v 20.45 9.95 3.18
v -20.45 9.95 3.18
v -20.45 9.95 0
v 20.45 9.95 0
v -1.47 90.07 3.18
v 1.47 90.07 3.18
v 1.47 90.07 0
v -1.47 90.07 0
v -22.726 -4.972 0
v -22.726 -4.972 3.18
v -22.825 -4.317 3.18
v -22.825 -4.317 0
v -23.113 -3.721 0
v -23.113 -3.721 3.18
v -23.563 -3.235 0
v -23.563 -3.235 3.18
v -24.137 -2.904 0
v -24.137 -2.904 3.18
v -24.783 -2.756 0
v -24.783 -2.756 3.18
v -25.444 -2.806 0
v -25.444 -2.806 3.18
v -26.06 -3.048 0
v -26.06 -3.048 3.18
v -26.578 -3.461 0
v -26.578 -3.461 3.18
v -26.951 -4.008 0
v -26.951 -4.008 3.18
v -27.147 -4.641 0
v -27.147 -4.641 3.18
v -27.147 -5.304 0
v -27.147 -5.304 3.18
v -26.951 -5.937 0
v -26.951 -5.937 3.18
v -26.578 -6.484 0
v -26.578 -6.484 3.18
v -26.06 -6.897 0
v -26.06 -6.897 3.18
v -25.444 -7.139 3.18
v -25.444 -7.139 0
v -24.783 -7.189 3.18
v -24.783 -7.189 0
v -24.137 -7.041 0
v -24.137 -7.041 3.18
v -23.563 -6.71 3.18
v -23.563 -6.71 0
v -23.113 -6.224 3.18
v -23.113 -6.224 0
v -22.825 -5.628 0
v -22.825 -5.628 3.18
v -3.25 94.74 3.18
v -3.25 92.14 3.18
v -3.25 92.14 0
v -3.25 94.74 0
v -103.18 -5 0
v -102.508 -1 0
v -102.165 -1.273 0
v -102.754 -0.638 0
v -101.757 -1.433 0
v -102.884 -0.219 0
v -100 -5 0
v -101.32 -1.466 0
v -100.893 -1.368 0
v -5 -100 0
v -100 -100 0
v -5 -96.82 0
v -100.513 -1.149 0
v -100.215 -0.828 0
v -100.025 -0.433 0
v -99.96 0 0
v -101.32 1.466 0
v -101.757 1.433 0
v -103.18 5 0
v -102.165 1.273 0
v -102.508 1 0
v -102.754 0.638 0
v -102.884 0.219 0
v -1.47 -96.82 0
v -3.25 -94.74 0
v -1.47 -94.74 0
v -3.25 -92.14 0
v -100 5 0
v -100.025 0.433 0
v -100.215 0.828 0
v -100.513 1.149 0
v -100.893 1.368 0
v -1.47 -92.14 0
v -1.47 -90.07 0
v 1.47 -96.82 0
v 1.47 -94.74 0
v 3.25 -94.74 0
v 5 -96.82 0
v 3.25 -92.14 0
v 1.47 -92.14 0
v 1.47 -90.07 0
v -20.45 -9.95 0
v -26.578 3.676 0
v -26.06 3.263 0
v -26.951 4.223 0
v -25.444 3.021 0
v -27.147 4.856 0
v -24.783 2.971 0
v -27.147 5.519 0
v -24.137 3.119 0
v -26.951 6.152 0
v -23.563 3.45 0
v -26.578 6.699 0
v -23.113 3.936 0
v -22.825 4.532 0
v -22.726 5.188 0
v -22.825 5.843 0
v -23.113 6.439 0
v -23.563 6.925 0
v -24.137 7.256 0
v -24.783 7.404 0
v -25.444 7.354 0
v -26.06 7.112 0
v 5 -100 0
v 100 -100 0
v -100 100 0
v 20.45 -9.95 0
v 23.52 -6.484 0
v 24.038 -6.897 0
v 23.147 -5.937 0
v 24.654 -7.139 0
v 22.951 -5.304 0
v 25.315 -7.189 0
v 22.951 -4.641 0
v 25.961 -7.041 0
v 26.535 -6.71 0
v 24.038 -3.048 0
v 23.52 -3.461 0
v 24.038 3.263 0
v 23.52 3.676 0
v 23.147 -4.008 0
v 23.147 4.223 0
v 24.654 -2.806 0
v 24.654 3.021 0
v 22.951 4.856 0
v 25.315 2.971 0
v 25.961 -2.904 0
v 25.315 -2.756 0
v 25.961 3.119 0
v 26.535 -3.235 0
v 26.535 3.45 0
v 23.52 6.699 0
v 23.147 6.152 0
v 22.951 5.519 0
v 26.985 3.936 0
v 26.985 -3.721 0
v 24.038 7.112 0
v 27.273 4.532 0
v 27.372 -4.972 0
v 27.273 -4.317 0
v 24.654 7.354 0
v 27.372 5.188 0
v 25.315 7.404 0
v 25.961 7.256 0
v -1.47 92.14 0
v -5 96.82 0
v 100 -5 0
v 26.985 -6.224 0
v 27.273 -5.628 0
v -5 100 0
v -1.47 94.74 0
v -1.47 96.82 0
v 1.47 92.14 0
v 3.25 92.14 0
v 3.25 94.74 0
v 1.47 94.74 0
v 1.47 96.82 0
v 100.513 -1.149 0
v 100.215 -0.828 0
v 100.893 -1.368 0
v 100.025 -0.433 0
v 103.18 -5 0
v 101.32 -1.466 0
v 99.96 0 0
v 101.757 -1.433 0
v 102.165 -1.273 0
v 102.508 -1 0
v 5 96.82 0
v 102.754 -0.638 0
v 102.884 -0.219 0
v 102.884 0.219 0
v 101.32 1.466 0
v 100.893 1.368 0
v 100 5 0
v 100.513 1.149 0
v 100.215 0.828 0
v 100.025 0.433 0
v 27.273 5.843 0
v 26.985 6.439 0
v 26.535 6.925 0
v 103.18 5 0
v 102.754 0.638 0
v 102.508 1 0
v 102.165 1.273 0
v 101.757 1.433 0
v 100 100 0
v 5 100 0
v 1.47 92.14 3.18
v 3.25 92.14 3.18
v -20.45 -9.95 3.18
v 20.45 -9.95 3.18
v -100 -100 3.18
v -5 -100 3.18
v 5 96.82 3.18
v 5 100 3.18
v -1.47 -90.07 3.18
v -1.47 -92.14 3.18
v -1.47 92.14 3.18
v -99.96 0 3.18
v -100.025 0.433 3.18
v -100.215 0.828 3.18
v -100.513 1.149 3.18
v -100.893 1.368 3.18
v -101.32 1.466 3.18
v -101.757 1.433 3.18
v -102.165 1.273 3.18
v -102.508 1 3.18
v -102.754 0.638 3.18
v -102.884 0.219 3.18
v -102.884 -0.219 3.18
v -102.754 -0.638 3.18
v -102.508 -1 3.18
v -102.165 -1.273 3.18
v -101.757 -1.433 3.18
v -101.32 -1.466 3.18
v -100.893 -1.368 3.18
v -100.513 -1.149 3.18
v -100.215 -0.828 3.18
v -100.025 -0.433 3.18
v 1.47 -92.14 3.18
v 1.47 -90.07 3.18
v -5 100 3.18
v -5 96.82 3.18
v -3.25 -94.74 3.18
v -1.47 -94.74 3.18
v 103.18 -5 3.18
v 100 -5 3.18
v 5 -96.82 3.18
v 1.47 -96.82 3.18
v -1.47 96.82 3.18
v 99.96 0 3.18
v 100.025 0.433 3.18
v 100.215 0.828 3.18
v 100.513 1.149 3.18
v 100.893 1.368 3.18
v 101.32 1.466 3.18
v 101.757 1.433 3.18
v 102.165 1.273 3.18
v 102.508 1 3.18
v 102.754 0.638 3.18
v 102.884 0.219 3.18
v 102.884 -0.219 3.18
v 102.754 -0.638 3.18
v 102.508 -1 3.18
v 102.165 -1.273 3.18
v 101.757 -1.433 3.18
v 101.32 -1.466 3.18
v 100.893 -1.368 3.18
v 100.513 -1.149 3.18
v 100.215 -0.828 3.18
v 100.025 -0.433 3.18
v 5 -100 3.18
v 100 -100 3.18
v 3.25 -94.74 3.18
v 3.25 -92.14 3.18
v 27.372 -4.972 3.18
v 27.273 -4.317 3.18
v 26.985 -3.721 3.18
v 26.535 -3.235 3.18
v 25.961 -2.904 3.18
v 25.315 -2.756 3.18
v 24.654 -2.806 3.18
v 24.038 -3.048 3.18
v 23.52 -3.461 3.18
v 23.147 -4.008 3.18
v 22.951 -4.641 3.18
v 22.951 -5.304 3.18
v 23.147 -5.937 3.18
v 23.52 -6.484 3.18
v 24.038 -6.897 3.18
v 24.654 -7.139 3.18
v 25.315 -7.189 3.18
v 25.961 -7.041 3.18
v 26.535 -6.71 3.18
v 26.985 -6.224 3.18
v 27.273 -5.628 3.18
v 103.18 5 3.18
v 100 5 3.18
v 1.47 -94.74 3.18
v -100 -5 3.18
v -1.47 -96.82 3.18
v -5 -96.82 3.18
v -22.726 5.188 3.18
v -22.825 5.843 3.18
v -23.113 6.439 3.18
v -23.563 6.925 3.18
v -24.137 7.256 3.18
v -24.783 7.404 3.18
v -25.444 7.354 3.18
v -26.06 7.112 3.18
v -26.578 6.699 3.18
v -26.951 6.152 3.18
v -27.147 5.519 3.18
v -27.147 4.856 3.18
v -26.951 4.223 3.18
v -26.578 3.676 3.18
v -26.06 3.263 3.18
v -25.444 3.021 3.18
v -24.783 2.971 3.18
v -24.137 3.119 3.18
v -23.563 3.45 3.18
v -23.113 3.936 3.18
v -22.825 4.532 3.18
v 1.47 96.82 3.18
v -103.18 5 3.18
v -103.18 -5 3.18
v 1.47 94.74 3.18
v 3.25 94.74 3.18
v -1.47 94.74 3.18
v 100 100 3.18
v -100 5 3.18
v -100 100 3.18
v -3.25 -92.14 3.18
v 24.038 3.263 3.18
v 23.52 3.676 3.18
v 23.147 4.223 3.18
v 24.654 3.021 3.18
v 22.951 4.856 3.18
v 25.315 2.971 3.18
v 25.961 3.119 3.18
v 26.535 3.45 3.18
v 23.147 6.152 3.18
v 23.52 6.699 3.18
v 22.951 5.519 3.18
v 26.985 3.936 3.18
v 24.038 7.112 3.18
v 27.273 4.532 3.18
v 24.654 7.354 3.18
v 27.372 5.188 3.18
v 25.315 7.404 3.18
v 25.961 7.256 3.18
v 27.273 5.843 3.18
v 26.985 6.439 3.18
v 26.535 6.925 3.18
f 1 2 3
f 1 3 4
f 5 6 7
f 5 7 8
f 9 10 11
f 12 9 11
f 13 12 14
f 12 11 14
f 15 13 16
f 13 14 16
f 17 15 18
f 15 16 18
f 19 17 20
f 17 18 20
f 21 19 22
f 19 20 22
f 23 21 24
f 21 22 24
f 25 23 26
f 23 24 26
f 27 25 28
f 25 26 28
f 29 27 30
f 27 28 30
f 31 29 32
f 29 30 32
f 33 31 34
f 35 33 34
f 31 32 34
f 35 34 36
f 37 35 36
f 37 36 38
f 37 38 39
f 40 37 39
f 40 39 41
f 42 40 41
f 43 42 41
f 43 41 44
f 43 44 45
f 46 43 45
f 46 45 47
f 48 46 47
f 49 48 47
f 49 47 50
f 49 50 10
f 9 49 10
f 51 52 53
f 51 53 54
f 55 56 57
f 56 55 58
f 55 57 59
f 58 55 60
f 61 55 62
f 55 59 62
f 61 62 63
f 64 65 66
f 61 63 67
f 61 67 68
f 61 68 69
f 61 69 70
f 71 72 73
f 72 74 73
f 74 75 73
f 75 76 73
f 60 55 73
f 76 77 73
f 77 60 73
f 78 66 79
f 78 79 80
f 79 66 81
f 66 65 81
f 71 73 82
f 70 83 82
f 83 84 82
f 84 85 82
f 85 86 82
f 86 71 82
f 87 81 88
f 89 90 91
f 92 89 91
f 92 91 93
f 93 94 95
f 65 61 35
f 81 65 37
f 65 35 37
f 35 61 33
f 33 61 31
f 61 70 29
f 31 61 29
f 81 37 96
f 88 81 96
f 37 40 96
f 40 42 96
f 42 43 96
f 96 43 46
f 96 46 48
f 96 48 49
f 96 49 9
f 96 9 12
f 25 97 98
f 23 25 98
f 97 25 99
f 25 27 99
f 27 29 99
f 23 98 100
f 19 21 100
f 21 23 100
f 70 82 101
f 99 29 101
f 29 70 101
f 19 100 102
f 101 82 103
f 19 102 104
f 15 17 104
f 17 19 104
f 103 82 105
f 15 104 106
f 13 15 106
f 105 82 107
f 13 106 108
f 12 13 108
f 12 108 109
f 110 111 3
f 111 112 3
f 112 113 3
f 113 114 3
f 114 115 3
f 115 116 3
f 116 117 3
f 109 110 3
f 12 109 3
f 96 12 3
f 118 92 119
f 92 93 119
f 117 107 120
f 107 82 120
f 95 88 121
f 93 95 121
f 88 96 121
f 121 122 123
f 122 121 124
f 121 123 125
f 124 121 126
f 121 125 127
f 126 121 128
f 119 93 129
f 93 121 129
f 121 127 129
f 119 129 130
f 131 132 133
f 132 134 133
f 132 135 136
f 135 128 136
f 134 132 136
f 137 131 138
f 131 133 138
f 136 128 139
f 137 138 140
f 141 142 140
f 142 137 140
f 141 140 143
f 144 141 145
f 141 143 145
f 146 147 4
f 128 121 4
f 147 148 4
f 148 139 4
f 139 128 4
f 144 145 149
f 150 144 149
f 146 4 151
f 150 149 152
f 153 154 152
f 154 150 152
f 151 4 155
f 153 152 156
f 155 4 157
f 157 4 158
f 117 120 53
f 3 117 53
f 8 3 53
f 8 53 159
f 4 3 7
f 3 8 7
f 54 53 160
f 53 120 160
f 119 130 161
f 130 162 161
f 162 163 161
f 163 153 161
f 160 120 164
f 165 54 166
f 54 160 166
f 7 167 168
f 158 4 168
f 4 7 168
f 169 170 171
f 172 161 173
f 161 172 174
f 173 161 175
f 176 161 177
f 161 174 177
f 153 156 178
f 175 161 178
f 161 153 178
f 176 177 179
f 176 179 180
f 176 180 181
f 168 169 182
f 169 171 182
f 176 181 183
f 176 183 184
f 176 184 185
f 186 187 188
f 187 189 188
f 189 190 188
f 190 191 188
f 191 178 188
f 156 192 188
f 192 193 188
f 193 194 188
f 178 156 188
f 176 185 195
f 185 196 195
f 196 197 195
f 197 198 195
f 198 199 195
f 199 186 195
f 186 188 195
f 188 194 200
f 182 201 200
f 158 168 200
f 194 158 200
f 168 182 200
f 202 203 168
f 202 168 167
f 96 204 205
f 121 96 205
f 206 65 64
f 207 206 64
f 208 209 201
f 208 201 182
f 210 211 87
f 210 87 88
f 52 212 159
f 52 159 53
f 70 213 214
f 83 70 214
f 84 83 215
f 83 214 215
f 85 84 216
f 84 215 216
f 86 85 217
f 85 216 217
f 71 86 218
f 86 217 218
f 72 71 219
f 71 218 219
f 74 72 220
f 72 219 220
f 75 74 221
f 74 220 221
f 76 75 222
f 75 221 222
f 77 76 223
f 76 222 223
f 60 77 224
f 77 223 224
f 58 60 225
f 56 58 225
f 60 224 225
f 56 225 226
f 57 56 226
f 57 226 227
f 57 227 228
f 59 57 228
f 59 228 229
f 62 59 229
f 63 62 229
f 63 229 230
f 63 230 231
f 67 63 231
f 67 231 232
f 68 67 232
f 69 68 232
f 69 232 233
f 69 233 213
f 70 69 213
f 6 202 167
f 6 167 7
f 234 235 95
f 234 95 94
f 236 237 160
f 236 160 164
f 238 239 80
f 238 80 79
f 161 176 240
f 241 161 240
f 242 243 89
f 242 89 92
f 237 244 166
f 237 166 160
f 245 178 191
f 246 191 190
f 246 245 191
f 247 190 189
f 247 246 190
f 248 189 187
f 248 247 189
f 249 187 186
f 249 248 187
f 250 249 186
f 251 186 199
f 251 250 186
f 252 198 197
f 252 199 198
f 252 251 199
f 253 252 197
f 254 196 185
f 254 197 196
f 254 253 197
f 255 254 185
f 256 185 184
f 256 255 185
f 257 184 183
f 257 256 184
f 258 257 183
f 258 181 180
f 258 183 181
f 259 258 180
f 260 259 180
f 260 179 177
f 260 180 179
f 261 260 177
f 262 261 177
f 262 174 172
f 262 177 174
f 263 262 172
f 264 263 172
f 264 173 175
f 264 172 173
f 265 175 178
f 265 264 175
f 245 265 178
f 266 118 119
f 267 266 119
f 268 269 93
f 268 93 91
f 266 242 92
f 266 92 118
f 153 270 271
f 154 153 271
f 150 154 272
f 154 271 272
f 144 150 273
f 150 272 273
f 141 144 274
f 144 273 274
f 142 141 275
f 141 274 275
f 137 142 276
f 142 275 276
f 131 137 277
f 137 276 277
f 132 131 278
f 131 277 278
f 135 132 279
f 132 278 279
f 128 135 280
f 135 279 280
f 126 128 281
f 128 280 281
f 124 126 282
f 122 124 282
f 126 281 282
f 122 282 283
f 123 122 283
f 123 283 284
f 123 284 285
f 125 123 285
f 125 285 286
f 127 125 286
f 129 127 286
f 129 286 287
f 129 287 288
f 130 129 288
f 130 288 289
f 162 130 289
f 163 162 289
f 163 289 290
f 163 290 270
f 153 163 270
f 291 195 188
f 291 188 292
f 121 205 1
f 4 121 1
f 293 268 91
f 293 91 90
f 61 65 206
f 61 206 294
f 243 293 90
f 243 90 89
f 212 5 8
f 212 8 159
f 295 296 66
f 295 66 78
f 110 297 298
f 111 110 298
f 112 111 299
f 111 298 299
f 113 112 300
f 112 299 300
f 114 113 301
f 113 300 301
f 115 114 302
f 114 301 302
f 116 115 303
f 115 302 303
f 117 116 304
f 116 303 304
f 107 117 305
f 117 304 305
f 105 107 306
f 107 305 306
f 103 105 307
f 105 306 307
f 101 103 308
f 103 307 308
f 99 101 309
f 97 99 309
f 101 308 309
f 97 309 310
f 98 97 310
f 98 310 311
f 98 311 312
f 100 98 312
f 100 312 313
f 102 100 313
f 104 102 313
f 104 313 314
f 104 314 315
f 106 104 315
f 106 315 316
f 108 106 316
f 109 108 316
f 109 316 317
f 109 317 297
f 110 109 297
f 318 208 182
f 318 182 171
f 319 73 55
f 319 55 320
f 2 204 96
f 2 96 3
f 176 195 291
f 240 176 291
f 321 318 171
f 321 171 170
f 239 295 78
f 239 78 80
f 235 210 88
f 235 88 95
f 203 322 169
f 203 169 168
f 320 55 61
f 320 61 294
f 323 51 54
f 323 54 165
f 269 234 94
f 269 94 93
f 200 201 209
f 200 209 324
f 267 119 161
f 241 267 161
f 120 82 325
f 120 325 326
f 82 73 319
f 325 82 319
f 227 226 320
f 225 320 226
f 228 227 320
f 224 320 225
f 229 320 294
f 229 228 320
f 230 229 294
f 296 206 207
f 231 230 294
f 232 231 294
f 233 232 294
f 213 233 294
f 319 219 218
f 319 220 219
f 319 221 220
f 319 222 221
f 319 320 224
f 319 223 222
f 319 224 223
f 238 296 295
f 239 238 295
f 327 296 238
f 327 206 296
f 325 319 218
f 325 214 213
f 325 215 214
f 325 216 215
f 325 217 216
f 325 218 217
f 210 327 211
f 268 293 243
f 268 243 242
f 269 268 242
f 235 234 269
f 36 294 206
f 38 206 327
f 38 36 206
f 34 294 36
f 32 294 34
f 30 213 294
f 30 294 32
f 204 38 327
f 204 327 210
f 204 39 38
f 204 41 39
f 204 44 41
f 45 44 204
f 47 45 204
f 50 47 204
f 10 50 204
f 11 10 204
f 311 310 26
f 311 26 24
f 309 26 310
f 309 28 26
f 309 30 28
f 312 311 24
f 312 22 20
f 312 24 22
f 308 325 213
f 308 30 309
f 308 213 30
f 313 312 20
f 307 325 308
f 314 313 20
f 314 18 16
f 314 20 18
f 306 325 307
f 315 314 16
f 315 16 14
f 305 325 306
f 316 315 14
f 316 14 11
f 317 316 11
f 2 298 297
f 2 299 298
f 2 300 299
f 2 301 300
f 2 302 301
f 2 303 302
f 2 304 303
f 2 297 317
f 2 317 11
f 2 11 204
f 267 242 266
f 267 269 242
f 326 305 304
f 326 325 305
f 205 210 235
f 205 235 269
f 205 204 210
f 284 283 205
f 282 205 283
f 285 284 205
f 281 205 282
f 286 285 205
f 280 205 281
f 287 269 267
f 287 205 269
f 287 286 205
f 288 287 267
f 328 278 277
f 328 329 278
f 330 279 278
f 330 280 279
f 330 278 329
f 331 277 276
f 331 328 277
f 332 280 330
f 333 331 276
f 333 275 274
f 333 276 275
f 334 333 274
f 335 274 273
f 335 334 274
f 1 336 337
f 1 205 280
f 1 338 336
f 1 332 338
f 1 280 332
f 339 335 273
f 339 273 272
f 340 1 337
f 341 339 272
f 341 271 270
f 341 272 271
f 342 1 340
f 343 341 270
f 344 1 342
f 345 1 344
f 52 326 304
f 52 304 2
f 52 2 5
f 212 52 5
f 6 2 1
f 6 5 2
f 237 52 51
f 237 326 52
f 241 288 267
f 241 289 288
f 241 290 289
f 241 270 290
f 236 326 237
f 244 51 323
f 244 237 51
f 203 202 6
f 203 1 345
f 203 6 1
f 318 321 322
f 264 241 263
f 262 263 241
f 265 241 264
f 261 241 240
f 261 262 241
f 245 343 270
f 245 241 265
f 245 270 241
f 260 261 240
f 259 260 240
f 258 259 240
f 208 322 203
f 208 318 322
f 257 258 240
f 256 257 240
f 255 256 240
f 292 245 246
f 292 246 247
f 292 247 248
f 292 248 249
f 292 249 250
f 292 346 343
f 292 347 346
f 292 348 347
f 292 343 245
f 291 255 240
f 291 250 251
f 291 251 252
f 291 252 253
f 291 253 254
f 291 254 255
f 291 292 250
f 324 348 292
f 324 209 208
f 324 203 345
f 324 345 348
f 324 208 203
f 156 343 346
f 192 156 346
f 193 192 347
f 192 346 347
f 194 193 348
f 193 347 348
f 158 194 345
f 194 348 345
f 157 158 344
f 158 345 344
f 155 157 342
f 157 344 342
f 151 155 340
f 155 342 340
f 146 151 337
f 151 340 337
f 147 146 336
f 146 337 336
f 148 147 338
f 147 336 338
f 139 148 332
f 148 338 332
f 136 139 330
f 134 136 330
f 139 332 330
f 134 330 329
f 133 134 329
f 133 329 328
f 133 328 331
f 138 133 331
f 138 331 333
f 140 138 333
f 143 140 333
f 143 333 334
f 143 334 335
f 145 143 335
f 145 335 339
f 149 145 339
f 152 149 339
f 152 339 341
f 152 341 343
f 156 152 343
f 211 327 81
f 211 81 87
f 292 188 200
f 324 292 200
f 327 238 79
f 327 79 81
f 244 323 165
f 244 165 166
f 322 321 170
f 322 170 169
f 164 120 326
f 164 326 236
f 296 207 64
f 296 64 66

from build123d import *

# Parameters (mm, degrees)
SKETCH2_W           = 200
SKETCH2_H           = 200
BOSS_EXTRUDE1_DEPTH = 3.18
CUT_EXTRUDE1_DEPTH  = 142.457104452
SKETCH4_W           = 3.18
SKETCH4_H           = 10
BOSS_EXTRUDE2_DEPTH = 3.18
SKETCH6_R           = 1.47
CUT_EXTRUDE2_DEPTH  = 144.722735849
SKETCH8_W           = 40.9
SKETCH8_H           = 19.9
CUT_EXTRUDE4_DEPTH  = 144.722735849
SKETCH10_R          = 2.2225
CUT_EXTRUDE6_DEPTH  = 144.722735849


with BuildPart() as part:
    # Sketch2 → Boss-Extrude1 (new body)
    with BuildSketch(Plane.XY):
        Rectangle(SKETCH2_W, SKETCH2_H)
    extrude(amount=BOSS_EXTRUDE1_DEPTH)

    # Sketch3 → Cut-Extrude1 (cut, through all)
    with BuildSketch(Plane.XY.offset(3.18)):
        Polygon((-5, 100), (5, 100), (5, 96.82), (1.47, 96.82), (1.47, 94.74), (3.25, 94.74), (3.25, 92.14), (1.47, 92.14), (1.47, 90.07), (-1.47, 90.07), (-1.47, 92.14), (-3.25, 92.14), (-3.25, 94.74), (-1.47, 94.74), (-1.47, 96.82), (-5, 96.82), align=None)
        Polygon((1.47, -96.82), (5, -96.82), (5, -100), (-5, -100), (-5, -96.82), (-1.47, -96.82), (-1.47, -94.74), (-3.25, -94.74), (-3.25, -92.14), (-1.47, -92.14), (-1.47, -90.07), (1.47, -90.07), (1.47, -92.14), (3.25, -92.14), (3.25, -94.74), (1.47, -94.74), align=None)
    extrude(amount=-CUT_EXTRUDE1_DEPTH, mode=Mode.SUBTRACT)

    # Sketch4 → Boss-Extrude2 (add)
    with BuildSketch(Plane.ZY.offset(100)):
        with Locations((1.59, 0)):
            Rectangle(SKETCH4_W, SKETCH4_H)
    boss_extrude2 = extrude(amount=BOSS_EXTRUDE2_DEPTH)

    # Sketch6 → Cut-Extrude2 (cut, through all)
    with BuildSketch(Plane.XY.offset(3.18)):
        with Locations((-101.43, 0)):
            Circle(SKETCH6_R)
    cut_extrude2 = extrude(amount=-CUT_EXTRUDE2_DEPTH, mode=Mode.SUBTRACT)

    # Mirror1: Boss-Extrude2 across plane
    add(boss_extrude2.mirror(Plane(origin=(0, 0, 0), x_dir=(0, 0, 1), z_dir=(1, 0, 0))))

    # Mirror2: Cut-Extrude2 across plane
    add(cut_extrude2.mirror(Plane(origin=(0, 0, 0), x_dir=(0, 0, 1), z_dir=(1, 0, 0))), mode=Mode.SUBTRACT)

    # Sketch8 → Cut-Extrude4 (cut, through all)
    with BuildSketch(Plane.XY.offset(3.18)):
        Rectangle(SKETCH8_W, SKETCH8_H)
    extrude(amount=-CUT_EXTRUDE4_DEPTH, mode=Mode.SUBTRACT)

    # Sketch10 → Cut-Extrude6 (cut, through all)
    with BuildSketch(Plane.XY.offset(3.18)):
        with Locations((-24.949, 5.1875)):
            Circle(SKETCH10_R)
        with Locations((-24.949, -4.9725)):
            Circle(SKETCH10_R)
        with Locations((25.149, 5.1875)):
            Circle(SKETCH10_R)
        with Locations((25.149, -4.9725)):
            Circle(SKETCH10_R)
    extrude(amount=-CUT_EXTRUDE6_DEPTH, mode=Mode.SUBTRACT)


solid = part.part
